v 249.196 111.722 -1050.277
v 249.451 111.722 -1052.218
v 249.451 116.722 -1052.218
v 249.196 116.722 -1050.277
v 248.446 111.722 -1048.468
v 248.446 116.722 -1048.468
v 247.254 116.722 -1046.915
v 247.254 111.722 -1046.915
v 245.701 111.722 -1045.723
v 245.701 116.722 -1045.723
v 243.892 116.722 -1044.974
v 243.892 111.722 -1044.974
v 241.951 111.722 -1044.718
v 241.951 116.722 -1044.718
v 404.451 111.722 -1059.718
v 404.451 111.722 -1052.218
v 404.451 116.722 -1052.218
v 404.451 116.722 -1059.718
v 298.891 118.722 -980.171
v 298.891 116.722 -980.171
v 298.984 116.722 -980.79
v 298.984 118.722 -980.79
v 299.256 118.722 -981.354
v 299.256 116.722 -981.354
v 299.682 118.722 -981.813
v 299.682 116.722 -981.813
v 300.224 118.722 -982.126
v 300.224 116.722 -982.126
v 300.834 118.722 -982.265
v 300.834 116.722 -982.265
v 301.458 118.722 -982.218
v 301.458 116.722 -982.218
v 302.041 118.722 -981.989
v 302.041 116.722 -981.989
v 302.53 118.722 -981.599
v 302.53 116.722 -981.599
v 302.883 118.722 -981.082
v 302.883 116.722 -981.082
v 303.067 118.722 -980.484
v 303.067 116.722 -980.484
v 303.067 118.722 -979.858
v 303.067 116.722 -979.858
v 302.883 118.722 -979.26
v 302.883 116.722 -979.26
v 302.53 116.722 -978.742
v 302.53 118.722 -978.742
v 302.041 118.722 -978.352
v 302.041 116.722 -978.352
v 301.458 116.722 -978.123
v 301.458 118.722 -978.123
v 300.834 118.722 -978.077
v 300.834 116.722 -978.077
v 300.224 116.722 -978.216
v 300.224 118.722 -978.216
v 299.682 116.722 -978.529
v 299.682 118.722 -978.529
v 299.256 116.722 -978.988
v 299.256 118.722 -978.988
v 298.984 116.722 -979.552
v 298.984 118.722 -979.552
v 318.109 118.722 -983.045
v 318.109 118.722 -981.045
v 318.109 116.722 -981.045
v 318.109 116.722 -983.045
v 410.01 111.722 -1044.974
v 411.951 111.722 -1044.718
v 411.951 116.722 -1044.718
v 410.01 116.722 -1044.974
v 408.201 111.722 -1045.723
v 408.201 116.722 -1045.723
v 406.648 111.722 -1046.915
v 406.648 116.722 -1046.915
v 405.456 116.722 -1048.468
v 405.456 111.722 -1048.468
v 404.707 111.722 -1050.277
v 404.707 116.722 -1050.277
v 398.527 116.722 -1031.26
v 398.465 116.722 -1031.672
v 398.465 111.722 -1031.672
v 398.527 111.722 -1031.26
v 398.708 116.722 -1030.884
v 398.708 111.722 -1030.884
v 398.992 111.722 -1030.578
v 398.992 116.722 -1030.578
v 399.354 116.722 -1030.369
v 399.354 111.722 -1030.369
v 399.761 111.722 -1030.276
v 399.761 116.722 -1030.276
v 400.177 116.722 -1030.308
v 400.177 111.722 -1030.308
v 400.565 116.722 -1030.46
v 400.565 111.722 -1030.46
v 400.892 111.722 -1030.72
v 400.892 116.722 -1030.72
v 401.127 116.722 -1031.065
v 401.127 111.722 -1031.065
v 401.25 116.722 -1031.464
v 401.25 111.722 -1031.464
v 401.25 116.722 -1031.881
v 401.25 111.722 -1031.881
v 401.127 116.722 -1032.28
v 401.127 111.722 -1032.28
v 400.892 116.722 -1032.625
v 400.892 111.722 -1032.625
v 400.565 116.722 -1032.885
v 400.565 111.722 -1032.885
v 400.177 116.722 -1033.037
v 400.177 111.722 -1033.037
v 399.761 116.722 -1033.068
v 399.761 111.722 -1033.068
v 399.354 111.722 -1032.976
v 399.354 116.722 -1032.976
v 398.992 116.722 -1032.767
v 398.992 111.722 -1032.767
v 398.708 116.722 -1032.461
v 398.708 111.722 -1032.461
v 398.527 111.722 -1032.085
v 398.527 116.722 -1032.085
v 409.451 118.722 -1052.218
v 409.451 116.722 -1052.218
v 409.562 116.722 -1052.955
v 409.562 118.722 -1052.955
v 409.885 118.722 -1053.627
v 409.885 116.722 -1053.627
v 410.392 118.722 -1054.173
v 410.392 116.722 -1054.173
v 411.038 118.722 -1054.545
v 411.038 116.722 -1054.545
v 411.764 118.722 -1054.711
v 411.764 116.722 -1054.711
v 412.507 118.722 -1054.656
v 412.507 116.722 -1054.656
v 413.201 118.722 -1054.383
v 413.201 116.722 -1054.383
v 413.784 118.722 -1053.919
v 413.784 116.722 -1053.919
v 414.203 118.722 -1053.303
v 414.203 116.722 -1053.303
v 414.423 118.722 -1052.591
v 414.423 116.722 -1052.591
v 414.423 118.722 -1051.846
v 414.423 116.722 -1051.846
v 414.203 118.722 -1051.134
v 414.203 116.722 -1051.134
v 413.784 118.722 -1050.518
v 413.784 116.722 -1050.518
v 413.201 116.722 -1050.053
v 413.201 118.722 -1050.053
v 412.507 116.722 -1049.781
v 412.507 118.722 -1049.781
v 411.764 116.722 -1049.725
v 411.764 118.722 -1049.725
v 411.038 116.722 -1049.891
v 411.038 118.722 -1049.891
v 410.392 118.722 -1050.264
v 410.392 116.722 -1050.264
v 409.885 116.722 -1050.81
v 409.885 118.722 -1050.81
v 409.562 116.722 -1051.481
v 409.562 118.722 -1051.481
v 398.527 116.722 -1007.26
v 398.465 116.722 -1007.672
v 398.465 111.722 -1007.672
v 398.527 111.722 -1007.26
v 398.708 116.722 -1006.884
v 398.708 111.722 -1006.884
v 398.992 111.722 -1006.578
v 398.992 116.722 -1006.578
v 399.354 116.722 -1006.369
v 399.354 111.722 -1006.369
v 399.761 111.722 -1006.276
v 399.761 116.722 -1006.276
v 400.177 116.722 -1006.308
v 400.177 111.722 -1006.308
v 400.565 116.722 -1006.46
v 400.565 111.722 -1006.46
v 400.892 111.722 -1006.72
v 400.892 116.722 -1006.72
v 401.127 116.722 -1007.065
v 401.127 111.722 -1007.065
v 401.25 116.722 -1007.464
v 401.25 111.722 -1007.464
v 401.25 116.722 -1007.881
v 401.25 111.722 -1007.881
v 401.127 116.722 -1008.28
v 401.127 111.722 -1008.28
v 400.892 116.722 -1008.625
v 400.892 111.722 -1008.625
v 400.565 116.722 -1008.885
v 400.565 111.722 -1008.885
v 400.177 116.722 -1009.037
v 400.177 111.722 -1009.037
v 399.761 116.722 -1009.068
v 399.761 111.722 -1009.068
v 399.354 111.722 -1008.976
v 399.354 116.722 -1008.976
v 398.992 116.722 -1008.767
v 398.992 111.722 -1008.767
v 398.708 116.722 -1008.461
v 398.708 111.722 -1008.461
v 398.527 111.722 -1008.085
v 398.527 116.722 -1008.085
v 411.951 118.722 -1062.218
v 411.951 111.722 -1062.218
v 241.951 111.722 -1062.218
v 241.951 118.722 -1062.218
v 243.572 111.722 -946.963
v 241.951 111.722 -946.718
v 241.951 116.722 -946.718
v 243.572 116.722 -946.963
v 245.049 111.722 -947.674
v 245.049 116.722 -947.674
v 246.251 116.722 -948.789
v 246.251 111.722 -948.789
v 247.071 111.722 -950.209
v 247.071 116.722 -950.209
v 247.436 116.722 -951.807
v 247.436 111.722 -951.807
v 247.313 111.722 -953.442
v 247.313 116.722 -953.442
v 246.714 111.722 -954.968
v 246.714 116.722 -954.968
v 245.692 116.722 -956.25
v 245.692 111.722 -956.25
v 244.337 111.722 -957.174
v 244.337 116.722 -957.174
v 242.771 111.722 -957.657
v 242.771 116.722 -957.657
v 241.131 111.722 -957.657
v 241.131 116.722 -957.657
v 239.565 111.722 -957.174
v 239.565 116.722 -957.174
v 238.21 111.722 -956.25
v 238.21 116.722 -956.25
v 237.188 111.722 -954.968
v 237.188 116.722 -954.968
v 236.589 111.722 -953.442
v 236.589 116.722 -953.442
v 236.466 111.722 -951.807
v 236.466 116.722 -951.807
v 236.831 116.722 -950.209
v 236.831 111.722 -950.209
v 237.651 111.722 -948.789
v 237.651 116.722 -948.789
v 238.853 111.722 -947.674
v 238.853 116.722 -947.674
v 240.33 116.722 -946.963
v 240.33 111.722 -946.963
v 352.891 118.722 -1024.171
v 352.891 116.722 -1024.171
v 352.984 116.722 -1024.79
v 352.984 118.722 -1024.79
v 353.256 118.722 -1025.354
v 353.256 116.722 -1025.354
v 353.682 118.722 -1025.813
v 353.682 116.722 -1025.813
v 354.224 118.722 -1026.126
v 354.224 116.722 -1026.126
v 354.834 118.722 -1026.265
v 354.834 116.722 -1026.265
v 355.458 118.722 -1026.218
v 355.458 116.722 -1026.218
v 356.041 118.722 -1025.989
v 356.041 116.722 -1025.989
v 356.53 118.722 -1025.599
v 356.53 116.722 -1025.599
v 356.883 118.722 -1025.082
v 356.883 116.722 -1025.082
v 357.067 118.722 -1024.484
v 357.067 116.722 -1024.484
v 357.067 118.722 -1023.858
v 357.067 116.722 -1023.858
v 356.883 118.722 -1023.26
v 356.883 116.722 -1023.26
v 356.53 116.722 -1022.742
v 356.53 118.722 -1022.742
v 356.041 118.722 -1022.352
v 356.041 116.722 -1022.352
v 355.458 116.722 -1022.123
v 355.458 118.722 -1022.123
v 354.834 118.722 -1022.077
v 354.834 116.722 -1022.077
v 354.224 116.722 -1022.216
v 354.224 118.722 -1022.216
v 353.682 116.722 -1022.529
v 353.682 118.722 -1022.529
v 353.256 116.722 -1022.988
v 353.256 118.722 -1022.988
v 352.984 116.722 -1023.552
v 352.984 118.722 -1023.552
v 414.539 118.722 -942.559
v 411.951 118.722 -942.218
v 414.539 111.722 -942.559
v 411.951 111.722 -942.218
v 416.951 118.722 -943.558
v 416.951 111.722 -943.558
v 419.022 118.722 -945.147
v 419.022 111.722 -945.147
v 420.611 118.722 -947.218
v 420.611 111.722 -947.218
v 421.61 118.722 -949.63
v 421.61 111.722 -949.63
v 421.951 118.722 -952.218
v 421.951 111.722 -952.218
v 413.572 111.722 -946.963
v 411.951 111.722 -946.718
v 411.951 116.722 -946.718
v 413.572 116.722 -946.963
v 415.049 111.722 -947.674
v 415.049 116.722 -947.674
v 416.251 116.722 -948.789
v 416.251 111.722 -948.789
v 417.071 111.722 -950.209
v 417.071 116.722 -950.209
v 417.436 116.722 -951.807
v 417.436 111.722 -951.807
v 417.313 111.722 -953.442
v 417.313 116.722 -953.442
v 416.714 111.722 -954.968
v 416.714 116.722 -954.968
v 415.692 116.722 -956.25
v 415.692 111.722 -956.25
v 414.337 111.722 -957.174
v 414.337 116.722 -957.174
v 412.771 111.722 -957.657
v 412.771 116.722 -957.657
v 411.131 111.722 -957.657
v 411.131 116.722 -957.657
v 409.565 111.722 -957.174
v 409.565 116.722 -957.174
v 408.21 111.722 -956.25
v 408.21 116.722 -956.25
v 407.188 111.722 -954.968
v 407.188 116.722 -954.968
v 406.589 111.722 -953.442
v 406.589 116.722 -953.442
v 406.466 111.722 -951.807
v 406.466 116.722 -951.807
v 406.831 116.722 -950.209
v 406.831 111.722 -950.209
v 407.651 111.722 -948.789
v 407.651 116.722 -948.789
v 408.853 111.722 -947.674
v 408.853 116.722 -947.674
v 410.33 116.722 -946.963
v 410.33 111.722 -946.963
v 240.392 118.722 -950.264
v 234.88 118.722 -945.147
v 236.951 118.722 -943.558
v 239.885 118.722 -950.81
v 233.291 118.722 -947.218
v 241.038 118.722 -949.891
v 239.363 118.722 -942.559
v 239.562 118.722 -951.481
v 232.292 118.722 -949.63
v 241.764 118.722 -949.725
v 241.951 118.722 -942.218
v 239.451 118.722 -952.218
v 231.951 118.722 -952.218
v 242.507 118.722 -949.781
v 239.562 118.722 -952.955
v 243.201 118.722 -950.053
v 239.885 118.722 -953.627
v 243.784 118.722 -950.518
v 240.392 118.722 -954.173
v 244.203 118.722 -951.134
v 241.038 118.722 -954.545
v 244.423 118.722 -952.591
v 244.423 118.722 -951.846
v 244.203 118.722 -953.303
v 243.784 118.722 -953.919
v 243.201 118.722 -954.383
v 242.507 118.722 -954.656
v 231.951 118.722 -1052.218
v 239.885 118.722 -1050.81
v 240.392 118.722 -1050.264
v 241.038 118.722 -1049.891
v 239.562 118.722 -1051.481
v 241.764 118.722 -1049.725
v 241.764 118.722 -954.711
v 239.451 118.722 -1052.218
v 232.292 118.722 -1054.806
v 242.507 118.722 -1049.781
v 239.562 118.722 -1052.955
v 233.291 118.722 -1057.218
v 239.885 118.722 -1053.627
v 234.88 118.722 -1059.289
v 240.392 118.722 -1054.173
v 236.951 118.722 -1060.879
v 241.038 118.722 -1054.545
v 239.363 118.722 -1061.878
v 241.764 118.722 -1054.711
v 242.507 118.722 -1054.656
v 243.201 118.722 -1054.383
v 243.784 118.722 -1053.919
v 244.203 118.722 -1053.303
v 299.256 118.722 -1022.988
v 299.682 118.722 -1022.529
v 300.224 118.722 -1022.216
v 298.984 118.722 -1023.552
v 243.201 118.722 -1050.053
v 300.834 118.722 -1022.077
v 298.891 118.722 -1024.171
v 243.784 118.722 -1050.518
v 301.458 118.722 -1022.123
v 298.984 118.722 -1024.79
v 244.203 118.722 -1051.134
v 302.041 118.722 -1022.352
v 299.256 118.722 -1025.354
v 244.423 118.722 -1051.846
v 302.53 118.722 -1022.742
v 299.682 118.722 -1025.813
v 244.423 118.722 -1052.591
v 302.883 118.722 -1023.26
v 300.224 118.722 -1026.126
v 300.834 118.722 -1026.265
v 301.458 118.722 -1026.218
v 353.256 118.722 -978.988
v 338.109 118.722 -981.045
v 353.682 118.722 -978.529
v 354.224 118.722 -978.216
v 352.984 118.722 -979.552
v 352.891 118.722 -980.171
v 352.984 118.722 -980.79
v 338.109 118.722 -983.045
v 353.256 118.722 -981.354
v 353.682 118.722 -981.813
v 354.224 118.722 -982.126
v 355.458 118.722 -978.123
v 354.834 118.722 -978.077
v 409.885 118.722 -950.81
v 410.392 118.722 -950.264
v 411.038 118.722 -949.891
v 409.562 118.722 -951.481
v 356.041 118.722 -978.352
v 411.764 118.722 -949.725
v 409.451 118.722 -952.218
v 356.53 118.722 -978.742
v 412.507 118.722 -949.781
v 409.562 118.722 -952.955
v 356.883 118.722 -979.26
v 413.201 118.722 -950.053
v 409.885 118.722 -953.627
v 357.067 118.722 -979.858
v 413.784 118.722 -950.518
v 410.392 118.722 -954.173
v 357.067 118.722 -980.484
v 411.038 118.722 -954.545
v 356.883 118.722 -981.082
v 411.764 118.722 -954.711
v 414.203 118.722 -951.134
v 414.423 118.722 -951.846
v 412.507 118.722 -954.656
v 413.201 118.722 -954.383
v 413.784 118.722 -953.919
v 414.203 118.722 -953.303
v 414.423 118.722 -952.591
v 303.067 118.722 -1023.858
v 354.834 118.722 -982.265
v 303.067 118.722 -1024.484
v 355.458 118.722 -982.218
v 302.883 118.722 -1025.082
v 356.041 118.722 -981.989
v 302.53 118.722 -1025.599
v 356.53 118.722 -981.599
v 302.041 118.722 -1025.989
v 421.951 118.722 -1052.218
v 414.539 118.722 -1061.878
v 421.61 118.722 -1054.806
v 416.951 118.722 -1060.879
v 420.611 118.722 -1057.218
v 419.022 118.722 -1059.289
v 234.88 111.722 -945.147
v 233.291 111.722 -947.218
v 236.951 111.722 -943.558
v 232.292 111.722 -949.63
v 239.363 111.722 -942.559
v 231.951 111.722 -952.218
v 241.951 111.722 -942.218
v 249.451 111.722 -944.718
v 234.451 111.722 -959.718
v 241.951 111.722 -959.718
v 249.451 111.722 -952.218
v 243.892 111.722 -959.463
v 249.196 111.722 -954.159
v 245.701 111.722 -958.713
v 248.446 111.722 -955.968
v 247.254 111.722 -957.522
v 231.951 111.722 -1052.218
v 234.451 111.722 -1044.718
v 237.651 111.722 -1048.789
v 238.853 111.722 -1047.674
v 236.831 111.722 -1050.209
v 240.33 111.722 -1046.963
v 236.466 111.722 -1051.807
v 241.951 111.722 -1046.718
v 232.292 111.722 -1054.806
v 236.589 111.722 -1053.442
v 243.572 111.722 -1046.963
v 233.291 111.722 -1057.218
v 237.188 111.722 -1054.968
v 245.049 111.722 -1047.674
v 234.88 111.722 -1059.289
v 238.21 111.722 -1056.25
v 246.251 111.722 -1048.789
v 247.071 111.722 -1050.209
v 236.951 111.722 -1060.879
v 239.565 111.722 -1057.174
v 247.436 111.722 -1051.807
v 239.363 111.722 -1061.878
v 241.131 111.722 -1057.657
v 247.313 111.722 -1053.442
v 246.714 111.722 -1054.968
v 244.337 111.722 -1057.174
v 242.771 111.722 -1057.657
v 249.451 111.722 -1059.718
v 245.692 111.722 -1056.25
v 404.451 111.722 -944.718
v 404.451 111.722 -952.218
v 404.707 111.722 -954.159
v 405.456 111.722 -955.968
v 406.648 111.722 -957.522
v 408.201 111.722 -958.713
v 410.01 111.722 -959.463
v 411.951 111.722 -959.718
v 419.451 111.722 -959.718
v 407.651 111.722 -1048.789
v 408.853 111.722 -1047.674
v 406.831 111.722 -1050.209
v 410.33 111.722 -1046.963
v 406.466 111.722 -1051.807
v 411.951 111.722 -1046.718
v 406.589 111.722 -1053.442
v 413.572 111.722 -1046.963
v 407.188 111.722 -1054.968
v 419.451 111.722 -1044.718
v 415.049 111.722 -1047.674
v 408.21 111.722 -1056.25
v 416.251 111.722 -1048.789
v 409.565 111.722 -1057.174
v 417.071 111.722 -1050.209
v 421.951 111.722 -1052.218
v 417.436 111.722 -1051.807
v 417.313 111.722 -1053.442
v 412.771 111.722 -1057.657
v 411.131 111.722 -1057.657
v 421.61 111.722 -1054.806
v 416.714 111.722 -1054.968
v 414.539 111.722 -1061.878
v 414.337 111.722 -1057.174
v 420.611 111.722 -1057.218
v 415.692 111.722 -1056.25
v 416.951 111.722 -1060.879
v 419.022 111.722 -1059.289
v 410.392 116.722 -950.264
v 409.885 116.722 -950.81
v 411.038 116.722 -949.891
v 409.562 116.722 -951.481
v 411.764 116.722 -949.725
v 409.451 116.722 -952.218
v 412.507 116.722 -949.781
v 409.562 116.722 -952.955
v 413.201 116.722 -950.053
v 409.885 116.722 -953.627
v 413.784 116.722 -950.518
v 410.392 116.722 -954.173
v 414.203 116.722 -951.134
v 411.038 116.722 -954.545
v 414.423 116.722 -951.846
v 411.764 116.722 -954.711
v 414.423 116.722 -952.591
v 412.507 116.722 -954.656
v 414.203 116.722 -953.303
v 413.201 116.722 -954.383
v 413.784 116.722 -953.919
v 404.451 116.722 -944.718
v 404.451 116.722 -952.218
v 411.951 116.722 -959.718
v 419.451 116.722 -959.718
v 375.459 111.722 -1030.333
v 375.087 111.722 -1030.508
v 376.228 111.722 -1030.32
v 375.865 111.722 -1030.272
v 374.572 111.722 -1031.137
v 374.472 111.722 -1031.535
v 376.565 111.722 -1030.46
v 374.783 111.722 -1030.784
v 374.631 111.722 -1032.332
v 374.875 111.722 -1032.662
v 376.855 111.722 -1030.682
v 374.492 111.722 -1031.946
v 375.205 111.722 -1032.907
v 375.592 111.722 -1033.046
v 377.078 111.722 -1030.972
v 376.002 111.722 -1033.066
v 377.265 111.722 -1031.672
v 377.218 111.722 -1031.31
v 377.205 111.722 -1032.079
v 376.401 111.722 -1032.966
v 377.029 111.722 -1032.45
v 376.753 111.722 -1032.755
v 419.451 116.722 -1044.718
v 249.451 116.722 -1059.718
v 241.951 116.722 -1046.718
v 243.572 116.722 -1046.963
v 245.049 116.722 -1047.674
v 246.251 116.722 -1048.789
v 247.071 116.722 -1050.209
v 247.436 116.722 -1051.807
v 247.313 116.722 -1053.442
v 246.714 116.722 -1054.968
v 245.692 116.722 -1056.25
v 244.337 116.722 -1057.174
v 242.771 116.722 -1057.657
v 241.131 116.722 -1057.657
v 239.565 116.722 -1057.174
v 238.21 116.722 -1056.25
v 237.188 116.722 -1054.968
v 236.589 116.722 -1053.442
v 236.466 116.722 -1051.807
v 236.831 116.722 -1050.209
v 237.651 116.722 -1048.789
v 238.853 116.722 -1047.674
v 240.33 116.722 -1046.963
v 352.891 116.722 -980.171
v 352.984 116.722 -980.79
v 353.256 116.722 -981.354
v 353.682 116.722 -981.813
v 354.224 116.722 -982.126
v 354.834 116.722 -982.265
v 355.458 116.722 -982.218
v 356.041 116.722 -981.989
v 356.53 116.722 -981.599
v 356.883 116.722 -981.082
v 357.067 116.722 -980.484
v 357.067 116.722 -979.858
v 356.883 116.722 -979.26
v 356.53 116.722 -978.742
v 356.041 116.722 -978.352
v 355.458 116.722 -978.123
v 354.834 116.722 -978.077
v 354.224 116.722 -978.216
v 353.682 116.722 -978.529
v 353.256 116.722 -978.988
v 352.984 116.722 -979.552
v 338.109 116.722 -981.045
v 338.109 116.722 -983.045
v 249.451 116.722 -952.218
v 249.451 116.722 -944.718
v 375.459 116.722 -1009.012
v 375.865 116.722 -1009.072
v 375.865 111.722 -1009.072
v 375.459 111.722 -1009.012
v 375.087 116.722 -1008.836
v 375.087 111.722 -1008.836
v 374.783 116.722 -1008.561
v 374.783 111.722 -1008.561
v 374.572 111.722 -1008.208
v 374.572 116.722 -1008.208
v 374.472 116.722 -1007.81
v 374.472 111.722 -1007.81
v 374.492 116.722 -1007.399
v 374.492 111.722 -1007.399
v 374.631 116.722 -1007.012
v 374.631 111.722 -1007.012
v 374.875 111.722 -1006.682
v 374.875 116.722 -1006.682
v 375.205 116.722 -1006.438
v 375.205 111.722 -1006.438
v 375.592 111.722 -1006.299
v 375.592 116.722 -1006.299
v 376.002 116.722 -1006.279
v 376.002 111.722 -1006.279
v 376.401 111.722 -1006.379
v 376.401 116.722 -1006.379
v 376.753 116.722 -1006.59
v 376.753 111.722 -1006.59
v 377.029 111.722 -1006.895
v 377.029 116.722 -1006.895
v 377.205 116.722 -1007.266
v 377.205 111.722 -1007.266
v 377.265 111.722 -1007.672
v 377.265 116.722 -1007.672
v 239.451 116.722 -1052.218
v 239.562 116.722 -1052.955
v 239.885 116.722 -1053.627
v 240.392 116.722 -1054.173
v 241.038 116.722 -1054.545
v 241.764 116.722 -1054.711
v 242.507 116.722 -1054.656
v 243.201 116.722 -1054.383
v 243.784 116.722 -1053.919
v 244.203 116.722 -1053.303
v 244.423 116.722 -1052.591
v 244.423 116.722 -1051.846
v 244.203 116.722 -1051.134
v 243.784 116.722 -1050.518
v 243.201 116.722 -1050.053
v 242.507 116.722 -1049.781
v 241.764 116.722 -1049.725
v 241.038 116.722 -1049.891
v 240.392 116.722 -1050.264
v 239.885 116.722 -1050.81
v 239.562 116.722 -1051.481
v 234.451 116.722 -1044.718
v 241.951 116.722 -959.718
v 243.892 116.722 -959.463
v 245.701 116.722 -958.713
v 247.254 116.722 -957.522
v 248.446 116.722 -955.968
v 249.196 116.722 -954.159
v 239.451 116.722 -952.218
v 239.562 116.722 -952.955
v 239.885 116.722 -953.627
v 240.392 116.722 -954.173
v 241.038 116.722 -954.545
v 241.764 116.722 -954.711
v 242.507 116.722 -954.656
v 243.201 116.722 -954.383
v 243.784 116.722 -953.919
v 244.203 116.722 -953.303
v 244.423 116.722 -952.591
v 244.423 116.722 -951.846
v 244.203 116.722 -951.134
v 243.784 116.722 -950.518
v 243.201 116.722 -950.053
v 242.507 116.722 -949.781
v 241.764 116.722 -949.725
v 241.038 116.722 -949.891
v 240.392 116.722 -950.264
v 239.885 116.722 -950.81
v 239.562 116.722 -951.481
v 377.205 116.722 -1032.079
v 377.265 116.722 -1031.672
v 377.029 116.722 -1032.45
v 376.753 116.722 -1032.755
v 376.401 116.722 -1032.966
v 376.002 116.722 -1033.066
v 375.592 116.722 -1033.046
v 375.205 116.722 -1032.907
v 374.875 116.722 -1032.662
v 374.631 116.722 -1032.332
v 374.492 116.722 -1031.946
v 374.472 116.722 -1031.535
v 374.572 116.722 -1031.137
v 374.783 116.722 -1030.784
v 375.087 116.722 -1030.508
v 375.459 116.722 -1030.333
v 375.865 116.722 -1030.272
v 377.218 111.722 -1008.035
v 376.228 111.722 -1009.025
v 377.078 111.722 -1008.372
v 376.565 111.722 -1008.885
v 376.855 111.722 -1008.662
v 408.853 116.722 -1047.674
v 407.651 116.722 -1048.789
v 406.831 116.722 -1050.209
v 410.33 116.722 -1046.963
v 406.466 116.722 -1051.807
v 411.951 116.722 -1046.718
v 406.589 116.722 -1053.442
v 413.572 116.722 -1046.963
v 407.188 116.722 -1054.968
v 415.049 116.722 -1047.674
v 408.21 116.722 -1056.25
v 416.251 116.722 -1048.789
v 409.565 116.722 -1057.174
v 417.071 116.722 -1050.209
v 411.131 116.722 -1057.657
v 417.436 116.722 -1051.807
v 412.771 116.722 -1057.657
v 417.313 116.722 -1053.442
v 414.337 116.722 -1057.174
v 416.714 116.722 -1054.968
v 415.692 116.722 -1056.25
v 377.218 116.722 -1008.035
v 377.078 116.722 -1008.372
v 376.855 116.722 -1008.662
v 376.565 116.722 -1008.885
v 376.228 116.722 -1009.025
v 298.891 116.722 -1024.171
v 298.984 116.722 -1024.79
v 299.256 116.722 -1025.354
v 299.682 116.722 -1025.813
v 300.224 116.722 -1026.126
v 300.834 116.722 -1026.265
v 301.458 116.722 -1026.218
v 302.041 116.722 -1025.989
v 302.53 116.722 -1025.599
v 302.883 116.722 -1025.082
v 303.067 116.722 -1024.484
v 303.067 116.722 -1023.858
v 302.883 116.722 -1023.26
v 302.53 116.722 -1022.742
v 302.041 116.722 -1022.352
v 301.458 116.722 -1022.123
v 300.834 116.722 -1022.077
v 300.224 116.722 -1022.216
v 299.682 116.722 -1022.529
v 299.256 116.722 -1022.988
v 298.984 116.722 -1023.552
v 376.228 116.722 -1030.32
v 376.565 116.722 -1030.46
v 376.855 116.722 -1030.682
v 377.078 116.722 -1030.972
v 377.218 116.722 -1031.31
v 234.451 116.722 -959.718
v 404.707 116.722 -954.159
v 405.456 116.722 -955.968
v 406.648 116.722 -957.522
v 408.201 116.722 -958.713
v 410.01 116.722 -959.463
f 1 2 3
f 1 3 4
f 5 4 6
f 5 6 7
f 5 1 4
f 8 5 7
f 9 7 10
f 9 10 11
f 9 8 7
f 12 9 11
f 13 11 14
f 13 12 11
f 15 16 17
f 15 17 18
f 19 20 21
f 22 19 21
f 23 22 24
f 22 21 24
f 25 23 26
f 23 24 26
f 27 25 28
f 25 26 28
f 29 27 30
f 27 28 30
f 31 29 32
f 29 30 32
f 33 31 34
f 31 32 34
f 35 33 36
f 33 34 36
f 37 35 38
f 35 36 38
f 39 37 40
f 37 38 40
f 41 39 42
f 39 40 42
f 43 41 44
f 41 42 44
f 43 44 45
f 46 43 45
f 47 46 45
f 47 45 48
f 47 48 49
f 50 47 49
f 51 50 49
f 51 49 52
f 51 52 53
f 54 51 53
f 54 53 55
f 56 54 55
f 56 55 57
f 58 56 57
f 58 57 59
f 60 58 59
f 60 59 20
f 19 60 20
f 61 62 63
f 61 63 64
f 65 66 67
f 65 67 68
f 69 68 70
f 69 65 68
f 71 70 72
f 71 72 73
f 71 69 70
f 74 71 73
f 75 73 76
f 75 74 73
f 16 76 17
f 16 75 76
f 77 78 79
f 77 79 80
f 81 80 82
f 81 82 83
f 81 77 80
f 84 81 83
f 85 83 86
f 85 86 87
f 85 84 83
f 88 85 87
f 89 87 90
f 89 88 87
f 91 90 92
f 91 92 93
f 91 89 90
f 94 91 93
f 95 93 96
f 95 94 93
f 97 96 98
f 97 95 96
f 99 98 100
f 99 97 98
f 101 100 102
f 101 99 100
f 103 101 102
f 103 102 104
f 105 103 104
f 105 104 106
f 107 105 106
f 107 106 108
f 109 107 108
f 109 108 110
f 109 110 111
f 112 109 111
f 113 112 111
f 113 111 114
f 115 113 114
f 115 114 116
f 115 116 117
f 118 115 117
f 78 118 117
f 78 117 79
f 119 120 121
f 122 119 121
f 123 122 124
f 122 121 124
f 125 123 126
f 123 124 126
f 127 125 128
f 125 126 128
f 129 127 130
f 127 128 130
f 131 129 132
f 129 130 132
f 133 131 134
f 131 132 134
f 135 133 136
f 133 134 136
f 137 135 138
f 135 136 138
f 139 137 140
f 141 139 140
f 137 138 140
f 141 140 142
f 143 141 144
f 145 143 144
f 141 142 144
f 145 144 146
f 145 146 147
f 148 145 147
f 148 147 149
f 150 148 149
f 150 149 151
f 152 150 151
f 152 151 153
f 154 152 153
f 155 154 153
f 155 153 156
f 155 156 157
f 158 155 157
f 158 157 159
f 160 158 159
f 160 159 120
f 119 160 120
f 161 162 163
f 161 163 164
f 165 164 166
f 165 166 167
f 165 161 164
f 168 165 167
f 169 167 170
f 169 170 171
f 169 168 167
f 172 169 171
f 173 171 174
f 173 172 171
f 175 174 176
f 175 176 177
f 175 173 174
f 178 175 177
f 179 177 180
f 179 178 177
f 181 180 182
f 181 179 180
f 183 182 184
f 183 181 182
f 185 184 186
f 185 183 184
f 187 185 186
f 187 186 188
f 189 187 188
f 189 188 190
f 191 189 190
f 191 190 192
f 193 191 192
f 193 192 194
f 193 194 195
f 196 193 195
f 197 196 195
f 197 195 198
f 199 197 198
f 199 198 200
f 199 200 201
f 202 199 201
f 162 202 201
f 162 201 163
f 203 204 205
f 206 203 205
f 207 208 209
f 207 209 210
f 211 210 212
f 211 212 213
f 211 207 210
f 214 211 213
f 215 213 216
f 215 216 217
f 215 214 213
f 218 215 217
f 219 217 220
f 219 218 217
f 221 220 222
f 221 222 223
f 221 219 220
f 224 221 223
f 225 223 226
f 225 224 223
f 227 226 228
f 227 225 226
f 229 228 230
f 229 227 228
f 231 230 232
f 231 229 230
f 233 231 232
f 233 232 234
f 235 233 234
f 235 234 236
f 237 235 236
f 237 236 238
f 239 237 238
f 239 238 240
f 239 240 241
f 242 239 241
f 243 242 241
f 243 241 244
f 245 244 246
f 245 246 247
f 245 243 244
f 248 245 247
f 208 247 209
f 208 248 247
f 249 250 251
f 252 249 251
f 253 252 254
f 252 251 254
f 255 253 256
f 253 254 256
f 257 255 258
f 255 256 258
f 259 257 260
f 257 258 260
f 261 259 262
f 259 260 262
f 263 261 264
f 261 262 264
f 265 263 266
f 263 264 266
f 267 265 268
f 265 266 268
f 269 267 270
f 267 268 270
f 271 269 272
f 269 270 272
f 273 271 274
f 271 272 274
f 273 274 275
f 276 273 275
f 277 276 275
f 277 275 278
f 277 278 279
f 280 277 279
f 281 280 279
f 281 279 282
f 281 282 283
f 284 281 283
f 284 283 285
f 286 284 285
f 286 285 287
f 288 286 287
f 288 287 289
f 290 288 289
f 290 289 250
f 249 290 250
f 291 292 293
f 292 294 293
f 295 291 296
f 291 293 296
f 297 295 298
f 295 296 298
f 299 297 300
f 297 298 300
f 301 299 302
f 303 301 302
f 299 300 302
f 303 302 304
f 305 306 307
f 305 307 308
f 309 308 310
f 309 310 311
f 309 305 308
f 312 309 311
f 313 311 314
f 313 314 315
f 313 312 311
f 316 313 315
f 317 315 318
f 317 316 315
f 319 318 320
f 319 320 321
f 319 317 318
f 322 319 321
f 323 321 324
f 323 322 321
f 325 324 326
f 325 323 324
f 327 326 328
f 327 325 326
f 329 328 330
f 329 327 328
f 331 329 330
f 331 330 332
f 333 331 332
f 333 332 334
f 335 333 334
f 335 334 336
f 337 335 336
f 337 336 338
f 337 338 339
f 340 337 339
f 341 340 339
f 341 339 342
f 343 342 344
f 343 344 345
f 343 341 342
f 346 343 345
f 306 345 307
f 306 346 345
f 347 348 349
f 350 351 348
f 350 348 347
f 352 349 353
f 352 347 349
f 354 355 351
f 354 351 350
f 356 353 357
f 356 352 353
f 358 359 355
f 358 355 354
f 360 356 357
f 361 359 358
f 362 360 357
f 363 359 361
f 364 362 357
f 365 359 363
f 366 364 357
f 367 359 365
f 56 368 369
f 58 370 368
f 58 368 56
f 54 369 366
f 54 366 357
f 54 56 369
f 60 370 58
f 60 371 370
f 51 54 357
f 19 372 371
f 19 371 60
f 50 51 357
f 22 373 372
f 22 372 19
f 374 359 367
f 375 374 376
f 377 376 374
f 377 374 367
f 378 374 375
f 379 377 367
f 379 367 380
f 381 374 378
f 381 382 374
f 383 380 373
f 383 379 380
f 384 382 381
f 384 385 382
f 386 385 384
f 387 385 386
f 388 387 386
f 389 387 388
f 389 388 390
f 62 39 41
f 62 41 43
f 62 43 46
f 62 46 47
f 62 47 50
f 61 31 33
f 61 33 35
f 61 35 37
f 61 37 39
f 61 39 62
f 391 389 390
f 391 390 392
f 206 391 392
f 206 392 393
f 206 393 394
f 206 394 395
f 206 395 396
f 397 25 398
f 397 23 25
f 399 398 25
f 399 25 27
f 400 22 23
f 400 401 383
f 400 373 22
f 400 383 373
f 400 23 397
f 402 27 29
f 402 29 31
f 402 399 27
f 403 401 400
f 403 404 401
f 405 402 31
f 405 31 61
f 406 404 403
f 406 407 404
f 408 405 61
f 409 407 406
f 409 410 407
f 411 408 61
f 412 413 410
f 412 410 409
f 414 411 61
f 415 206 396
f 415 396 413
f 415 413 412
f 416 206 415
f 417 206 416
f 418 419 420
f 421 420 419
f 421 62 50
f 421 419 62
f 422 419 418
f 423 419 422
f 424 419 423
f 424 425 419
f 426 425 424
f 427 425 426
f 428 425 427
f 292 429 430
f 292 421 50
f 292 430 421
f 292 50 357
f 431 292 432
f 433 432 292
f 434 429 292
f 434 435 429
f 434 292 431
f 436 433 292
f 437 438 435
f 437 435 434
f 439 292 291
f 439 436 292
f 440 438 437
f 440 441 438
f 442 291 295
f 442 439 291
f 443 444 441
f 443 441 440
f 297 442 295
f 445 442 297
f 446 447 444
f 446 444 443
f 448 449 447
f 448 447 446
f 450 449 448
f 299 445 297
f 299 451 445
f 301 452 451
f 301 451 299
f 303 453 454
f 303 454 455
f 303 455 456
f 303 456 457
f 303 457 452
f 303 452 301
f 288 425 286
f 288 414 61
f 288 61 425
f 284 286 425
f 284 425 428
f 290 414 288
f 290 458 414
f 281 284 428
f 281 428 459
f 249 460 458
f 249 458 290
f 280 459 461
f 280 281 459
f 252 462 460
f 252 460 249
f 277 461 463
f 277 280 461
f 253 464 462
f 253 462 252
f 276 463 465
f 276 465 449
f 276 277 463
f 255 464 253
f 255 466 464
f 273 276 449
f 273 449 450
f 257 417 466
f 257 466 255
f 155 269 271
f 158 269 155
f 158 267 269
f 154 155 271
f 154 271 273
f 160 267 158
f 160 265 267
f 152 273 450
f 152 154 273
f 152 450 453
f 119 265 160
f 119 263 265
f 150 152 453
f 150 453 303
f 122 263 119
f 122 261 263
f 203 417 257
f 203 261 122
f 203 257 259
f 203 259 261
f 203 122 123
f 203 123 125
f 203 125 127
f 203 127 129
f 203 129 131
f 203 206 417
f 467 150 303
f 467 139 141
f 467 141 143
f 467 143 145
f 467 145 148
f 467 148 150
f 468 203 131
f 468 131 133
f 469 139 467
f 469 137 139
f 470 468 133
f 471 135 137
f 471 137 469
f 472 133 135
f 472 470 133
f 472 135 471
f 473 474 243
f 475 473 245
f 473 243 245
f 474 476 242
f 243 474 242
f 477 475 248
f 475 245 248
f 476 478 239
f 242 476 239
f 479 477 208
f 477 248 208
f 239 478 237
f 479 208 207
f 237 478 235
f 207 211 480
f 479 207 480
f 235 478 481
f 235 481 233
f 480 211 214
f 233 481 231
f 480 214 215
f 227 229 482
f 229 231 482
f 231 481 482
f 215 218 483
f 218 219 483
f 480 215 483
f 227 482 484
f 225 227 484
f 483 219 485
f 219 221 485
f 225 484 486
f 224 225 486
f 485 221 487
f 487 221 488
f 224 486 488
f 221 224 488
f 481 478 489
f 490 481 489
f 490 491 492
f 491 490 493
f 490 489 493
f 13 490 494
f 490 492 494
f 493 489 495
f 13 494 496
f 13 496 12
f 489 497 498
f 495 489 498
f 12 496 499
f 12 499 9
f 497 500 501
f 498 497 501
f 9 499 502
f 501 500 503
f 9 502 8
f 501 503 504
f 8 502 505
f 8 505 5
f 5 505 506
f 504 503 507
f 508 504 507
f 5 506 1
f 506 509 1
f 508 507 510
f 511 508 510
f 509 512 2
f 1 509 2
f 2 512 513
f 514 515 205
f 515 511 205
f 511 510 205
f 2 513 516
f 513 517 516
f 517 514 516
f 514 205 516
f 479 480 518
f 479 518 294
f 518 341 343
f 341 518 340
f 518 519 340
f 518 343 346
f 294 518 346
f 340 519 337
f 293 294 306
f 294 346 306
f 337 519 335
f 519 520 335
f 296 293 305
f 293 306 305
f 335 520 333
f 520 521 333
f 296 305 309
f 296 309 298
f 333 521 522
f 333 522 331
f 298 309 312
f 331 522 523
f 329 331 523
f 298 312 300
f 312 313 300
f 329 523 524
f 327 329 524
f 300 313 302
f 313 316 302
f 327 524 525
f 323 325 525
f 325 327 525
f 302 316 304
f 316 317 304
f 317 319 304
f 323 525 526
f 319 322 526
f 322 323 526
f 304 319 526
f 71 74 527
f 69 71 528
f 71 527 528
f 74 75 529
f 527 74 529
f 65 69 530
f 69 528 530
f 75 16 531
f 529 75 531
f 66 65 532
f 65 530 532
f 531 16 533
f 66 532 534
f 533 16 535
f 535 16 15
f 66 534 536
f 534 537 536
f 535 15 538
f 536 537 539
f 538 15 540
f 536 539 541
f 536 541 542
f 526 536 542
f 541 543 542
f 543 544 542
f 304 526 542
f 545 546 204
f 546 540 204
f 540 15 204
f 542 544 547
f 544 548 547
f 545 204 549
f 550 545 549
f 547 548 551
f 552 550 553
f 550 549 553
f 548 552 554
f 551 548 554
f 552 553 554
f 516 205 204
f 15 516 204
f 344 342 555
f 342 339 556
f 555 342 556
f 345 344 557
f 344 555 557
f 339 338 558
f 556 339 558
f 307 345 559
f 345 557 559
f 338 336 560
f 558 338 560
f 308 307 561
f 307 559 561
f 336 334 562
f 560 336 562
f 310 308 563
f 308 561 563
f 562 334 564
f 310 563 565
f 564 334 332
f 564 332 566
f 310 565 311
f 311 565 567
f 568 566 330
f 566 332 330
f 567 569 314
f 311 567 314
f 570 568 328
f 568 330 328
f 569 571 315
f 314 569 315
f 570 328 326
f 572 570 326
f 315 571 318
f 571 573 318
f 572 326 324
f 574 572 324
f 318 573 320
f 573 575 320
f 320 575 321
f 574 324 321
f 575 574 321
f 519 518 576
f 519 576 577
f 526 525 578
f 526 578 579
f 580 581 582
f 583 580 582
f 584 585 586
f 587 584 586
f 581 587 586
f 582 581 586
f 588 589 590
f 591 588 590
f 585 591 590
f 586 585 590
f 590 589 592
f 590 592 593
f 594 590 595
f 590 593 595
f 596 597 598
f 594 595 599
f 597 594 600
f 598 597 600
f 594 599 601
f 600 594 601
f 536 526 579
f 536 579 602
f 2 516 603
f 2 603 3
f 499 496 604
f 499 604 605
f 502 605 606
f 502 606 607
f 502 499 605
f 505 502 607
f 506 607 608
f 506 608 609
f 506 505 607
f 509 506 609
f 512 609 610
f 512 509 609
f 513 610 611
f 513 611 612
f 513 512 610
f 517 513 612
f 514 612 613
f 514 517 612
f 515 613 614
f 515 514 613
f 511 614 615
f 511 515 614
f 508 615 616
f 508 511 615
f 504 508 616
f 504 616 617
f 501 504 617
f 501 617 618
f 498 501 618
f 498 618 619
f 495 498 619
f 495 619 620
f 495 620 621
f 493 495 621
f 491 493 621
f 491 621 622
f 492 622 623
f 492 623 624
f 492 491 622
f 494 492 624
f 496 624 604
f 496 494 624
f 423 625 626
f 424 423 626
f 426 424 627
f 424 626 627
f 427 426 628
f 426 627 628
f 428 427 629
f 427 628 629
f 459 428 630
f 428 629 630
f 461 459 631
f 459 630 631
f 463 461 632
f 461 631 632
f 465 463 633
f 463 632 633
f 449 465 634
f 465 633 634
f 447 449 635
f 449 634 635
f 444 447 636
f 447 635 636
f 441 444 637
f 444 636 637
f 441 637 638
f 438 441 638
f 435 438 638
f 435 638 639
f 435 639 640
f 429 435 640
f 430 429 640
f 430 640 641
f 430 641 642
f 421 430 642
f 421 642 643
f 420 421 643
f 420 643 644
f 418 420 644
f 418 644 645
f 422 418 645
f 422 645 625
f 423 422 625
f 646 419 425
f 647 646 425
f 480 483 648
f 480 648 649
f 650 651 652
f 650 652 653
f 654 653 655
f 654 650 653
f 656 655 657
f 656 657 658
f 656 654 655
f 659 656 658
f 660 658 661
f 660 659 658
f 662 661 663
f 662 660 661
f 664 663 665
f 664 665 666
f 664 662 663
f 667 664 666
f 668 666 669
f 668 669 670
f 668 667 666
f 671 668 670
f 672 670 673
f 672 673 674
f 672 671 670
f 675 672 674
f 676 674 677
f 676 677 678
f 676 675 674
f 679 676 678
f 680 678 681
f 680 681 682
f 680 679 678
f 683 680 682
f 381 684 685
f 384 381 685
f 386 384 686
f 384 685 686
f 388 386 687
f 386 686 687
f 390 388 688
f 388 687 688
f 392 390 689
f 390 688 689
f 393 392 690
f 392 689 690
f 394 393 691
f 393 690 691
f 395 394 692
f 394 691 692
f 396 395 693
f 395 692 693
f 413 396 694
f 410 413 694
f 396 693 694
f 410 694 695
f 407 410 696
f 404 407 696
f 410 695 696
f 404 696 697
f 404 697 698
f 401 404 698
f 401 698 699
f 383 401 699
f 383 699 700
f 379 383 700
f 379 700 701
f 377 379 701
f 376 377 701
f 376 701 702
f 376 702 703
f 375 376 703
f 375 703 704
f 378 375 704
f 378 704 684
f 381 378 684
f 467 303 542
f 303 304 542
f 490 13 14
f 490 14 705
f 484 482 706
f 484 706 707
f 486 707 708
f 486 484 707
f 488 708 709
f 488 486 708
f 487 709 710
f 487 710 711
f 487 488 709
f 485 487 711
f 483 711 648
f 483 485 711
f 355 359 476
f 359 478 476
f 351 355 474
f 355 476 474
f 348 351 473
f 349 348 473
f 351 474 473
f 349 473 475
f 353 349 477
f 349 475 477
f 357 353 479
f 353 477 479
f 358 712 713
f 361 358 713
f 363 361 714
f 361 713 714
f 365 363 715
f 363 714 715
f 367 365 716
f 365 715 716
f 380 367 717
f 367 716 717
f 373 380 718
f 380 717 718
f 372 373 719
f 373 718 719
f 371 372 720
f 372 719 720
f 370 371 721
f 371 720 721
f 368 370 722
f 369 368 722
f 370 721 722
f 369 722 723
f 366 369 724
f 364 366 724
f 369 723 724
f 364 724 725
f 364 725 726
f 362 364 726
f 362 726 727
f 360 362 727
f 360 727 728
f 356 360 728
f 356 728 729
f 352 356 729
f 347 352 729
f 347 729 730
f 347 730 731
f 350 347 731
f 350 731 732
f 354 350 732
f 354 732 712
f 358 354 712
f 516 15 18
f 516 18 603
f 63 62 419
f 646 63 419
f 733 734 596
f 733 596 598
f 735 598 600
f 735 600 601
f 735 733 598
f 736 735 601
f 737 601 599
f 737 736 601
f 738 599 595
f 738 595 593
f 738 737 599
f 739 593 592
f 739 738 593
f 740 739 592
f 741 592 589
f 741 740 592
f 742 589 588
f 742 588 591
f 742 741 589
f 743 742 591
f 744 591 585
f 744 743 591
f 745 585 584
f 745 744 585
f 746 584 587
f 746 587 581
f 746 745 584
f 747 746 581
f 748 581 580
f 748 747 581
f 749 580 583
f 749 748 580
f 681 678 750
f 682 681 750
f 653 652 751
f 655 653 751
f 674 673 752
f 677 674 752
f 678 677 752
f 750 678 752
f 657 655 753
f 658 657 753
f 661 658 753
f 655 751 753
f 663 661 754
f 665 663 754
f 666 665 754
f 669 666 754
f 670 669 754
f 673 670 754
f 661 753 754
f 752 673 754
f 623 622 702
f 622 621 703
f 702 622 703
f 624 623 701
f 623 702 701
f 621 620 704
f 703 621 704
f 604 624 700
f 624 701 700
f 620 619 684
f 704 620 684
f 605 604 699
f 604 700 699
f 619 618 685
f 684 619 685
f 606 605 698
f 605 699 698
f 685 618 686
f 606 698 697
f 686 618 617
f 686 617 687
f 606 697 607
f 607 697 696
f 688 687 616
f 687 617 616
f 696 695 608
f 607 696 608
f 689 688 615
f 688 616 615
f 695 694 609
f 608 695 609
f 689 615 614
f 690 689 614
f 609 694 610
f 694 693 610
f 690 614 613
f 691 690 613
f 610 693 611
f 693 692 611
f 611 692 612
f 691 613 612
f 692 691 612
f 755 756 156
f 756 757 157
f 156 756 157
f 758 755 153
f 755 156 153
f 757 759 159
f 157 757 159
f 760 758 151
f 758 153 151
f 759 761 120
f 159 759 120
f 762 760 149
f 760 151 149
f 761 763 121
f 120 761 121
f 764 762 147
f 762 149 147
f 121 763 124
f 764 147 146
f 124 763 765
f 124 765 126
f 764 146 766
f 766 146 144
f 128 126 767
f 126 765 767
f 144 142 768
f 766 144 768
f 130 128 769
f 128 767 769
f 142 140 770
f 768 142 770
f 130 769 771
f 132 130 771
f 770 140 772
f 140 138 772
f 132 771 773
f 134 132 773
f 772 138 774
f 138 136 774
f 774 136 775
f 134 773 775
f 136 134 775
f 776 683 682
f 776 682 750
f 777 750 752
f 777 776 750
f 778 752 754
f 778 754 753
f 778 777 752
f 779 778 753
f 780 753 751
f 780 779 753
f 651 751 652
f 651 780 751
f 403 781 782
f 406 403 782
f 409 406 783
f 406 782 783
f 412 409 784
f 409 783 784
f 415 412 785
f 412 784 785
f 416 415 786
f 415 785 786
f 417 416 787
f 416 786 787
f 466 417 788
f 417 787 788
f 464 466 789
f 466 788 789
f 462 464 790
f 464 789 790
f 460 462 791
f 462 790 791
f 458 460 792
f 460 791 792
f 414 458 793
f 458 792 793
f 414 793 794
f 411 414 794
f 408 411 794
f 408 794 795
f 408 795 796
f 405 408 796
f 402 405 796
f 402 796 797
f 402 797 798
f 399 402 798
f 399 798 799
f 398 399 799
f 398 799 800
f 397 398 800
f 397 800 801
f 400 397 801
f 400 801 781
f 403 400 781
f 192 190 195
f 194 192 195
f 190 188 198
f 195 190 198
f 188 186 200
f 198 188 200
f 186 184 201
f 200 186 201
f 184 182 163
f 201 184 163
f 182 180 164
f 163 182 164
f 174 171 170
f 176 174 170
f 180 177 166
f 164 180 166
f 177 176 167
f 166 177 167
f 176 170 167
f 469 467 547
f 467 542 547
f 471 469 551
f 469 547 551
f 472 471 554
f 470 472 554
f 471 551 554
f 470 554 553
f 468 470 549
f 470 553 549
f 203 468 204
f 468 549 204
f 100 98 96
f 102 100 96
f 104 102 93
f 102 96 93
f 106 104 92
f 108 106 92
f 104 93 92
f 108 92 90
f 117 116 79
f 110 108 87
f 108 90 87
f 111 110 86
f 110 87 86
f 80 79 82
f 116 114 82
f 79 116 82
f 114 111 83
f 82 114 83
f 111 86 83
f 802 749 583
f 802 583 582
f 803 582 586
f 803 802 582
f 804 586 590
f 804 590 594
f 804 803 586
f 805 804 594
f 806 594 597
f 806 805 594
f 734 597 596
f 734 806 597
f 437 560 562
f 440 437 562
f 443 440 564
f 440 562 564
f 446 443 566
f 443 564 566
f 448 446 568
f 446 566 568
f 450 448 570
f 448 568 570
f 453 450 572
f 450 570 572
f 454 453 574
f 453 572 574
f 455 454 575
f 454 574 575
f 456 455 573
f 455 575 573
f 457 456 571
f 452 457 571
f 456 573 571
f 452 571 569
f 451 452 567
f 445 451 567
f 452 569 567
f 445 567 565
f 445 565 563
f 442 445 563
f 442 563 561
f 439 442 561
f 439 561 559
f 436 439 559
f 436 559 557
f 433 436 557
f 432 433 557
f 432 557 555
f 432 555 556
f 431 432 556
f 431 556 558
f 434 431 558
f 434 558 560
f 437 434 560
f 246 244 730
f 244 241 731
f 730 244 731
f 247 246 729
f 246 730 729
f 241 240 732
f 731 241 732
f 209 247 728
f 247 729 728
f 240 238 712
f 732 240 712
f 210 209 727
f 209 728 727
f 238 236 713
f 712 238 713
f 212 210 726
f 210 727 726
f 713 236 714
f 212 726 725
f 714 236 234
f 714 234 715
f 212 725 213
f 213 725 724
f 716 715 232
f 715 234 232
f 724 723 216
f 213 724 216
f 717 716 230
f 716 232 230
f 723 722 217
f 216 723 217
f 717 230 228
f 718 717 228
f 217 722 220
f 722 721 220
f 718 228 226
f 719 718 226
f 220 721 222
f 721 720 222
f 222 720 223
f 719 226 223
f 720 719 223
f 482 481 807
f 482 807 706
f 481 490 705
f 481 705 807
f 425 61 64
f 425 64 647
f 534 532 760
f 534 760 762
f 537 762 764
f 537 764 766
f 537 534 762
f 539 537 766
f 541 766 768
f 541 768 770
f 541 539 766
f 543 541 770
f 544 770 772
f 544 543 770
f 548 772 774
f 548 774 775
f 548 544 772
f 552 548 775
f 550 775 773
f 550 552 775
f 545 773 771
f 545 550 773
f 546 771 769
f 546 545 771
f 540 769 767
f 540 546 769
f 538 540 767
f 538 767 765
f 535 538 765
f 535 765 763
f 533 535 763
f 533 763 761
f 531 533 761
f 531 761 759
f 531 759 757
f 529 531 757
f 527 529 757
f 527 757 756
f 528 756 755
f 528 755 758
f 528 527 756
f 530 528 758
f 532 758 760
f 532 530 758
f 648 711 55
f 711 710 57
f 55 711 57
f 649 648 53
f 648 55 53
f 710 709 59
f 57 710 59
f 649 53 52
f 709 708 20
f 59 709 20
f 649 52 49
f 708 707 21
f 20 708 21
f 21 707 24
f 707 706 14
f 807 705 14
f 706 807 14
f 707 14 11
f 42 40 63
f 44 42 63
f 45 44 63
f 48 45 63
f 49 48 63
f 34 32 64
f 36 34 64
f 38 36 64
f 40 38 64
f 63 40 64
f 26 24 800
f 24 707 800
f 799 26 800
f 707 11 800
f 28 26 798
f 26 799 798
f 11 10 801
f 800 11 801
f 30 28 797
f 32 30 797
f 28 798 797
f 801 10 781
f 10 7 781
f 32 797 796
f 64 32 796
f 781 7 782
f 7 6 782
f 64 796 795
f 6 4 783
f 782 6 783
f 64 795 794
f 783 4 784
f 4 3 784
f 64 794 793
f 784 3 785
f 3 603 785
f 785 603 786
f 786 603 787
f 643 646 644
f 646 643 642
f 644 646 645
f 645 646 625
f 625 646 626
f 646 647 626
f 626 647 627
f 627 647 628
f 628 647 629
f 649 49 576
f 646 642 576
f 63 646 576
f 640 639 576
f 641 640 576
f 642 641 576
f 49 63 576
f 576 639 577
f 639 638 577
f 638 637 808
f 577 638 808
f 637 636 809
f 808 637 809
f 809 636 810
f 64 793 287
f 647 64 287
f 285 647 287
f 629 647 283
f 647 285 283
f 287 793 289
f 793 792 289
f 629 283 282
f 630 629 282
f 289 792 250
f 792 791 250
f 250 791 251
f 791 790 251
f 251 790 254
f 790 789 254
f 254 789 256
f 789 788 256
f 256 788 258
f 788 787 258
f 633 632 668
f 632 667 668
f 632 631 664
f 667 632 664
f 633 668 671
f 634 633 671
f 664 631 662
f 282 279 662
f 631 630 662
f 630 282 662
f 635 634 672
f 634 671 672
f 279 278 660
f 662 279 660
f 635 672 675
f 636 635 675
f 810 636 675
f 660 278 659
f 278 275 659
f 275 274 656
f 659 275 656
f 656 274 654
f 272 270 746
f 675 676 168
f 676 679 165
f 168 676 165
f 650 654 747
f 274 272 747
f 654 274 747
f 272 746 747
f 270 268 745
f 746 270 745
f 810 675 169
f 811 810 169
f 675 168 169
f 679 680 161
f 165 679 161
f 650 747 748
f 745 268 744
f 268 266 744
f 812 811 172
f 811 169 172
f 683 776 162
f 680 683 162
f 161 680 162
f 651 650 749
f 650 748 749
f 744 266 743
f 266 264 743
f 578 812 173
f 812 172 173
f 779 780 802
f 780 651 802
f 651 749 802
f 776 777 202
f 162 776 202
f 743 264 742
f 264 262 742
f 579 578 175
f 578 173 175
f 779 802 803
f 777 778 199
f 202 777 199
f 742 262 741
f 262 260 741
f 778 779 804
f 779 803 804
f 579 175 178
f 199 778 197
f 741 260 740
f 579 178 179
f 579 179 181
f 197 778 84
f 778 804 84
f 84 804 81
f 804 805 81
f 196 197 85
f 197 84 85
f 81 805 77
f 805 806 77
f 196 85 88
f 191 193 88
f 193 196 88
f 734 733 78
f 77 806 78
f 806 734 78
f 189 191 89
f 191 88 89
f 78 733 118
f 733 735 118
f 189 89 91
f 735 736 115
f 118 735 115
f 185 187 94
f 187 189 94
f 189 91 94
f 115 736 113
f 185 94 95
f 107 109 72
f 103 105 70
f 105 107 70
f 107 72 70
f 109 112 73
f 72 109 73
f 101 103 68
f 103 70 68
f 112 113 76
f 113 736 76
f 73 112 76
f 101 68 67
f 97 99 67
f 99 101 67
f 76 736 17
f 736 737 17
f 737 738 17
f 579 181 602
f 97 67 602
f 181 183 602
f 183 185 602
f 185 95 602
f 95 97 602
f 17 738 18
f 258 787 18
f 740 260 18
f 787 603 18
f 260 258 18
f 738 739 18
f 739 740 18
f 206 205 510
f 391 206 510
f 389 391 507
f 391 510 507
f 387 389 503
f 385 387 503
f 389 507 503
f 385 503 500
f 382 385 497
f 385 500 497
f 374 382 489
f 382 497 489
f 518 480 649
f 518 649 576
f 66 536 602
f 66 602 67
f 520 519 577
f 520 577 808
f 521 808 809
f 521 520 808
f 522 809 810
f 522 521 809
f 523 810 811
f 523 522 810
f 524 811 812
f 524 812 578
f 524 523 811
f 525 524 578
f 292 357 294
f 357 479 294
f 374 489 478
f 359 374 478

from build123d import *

# Parameters (mm, degrees)
SKETCH1_R                      = 5.5
BOSS_EXTRUDE1_DEPTH            = 5
BOSS_EXTRUDE2_DEPTH            = 2
SKETCH4_R                      = 1.4
BOSS_EXTRUDE3_DEPTH            = 7
SKETCH12_W                     = 20
SKETCH12_H                     = 2
CUT_EXTRUDE1_DEPTH             = 10
F_4_2_4_2_DIAMETER_HOLE1_D     = 4.2
F_4_2_4_2_DIAMETER_HOLE1_DEPTH = 20
F_4_2_4_2_DIAMETER_HOLE1_TIP   = 1.2618073
F_5_0_5_DIAMETER_HOLE1_D       = 5
F_5_0_5_DIAMETER_HOLE1_DEPTH   = 5
F_5_0_5_DIAMETER_HOLE1_TIP     = 1.502151548


with BuildPart() as part:
    # Sketch1 → Boss-Extrude1 (new body)
    with BuildSketch(Plane(origin=(0, 111.722415865, 0), x_dir=(1, 0, 0), z_dir=(0, 1, 0))):
        with BuildLine():
            Line((241.95107426, 942.218289838), (411.95107426, 942.218289838))
            ThreePointArc((411.95107426, 942.218289838), (419.022142072, 945.147222026), (421.95107426, 952.218289838))
            Line((421.95107426, 952.218289838), (421.95107426, 1052.218289838))
            ThreePointArc((421.95107426, 1052.218289838), (419.022142072, 1059.28935765), (411.95107426, 1062.218289838))
            Line((411.95107426, 1062.218289838), (241.95107426, 1062.218289838))
            ThreePointArc((241.95107426, 1062.218289838), (234.880006448, 1059.28935765), (231.95107426, 1052.218289838))
            Line((231.95107426, 1052.218289838), (231.95107426, 952.218289838))
            ThreePointArc((231.95107426, 952.218289838), (234.880006448, 945.147222026), (241.95107426, 942.218289838))
        make_face()
        with Locations(Location((241.95107426, 952.218289838, 0), (0, 0, 270))):
            Circle(SKETCH1_R, mode=Mode.SUBTRACT)
        with Locations(Location((411.95107426, 952.218289838, 0), (0, 0, 270))):
            Circle(SKETCH1_R, mode=Mode.SUBTRACT)
        with Locations(Location((411.95107426, 1052.218289838, 0), (0, 0, 270))):
            Circle(SKETCH1_R, mode=Mode.SUBTRACT)
        with Locations(Location((241.95107426, 1052.218289838, 0), (0, 0, 270))):
            Circle(SKETCH1_R, mode=Mode.SUBTRACT)
        with BuildLine():
            Line((249.45107426, 952.218289838), (249.45107426, 944.718289838))
            Line((249.45107426, 944.718289838), (404.45107426, 944.718289838))
            Line((404.45107426, 944.718289838), (404.45107426, 952.218289838))
            ThreePointArc((404.45107426, 952.218289838), (406.647773401, 957.521590697), (411.95107426, 959.718289838))
            Line((411.95107426, 959.718289838), (419.45107426, 959.718289838))
            Line((419.45107426, 959.718289838), (419.45107426, 1044.718289838))
            Line((419.45107426, 1044.718289838), (411.95107426, 1044.718289838))
            ThreePointArc((411.95107426, 1044.718289838), (406.647773401, 1046.914988979), (404.45107426, 1052.218289838))
            Line((404.45107426, 1052.218289838), (404.45107426, 1059.718289838))
            Line((404.45107426, 1059.718289838), (249.45107426, 1059.718289838))
            Line((249.45107426, 1059.718289838), (249.45107426, 1052.218289838))
            ThreePointArc((249.45107426, 1052.218289838), (247.254375119, 1046.914988979), (241.95107426, 1044.718289838))
            Line((241.95107426, 1044.718289838), (234.45107426, 1044.718289838))
            Line((234.45107426, 1044.718289838), (234.45107426, 959.718289838))
            Line((234.45107426, 959.718289838), (241.95107426, 959.718289838))
            ThreePointArc((241.95107426, 959.718289838), (247.254375119, 957.521590697), (249.45107426, 952.218289838))
        make_face(mode=Mode.SUBTRACT)
    extrude(amount=BOSS_EXTRUDE1_DEPTH)

    # Sketch2 → Boss-Extrude2 (add)
    with BuildSketch(Plane(origin=(0, 116.722415865, 0), x_dir=(1, 0, 0), z_dir=(0, 1, 0))):
        with BuildLine():
            Line((231.95107426, 1052.218289838), (231.95107426, 952.218289838))
            ThreePointArc((231.95107426, 952.218289838), (234.880006448, 945.147222026), (241.95107426, 942.218289838))
            Line((241.95107426, 942.218289838), (411.95107426, 942.218289838))
            ThreePointArc((411.95107426, 942.218289838), (419.022142072, 945.147222026), (421.95107426, 952.218289838))
            Line((421.95107426, 952.218289838), (421.95107426, 1052.218289838))
            ThreePointArc((421.95107426, 1052.218289838), (419.022142072, 1059.28935765), (411.95107426, 1062.218289838))
            Line((411.95107426, 1062.218289838), (241.95107426, 1062.218289838))
            ThreePointArc((241.95107426, 1062.218289838), (234.880006448, 1059.28935765), (231.95107426, 1052.218289838))
        make_face()
    extrude(amount=BOSS_EXTRUDE2_DEPTH)

    # Sketch4 → Boss-Extrude3 (add)
    with BuildSketch(Plane(origin=(0, 118.722415865, 0), x_dir=(1, 0, 0), z_dir=(0, 1, 0))):
        with BuildLine():
            Line((375.86522753, 1030.272411662), (375.86522753, 1031.672411662))
            Line((375.86522753, 1031.672411662), (377.26522753, 1031.672411662))
            ThreePointArc((377.26522753, 1031.672411662), (374.875278036, 1032.662361156), (375.86522753, 1030.272411662))
        make_face()
        with BuildLine():
            Line((377.26522753, 1031.672411662), (375.86522753, 1031.672411662))
            Line((375.86522753, 1031.672411662), (375.86522753, 1030.272411662))
            ThreePointArc((375.86522753, 1030.272411662), (376.855177023, 1030.682462168), (377.26522753, 1031.672411662))
        make_face()
        with BuildLine():
            ThreePointArc((377.26522753, 1007.672411662), (376.855177023, 1008.662361156), (375.86522753, 1009.072411662))
            Line((375.86522753, 1009.072411662), (375.86522753, 1007.672411662))
            Line((375.86522753, 1007.672411662), (377.26522753, 1007.672411662))
        make_face()
        with BuildLine():
            Line((375.86522753, 1007.672411662), (375.86522753, 1009.072411662))
            ThreePointArc((375.86522753, 1009.072411662), (374.875278036, 1006.682462168), (377.26522753, 1007.672411662))
            Line((377.26522753, 1007.672411662), (375.86522753, 1007.672411662))
        make_face()
        with Locations(Location((399.86522753, 1031.672411662, 0), (0, 0, 180))):
            Circle(SKETCH4_R)
        with Locations(Location((399.86522753, 1007.672411662, 0), (0, 0, 180))):
            Circle(SKETCH4_R)
    extrude(amount=-BOSS_EXTRUDE3_DEPTH)

    # Sketch12 → Cut-Extrude1 (cut)
    with BuildSketch(Plane(origin=(0, 118.722415865, 0), x_dir=(1, 0, 0), z_dir=(0, 1, 0))):
        with Locations((328.108762335, 982.045276567)):
            Rectangle(SKETCH12_W, SKETCH12_H)
    extrude(amount=-CUT_EXTRUDE1_DEPTH, mode=Mode.SUBTRACT)

    # Ø4.2 (4.2) Diameter Hole1
    with Locations(Plane(origin=(0, 118.722415865, 0), x_dir=(1, 0, 0), z_dir=(0, 1, 0))):
        with Locations((300.990952506, 1024.17077451), (354.990952506, 1024.17077451), (354.990952506, 980.17077451), (300.990952506, 980.17077451)):
            Hole(F_4_2_4_2_DIAMETER_HOLE1_D / 2, depth=F_4_2_4_2_DIAMETER_HOLE1_DEPTH)
            with Locations((0, 0, -(F_4_2_4_2_DIAMETER_HOLE1_DEPTH + F_4_2_4_2_DIAMETER_HOLE1_TIP / 2))):  # 118° drill point
                Cone(0, F_4_2_4_2_DIAMETER_HOLE1_D / 2, F_4_2_4_2_DIAMETER_HOLE1_TIP, mode=Mode.SUBTRACT)

    # Ø5.0 (5) Diameter Hole1
    with Locations(Plane(origin=(0, 118.722415865, 0), x_dir=(1, 0, 0), z_dir=(0, 1, 0))):
        with Locations((241.95107426, 1052.218289838), (411.95107426, 1052.218289838), (411.95107426, 952.218289838), (241.95107426, 952.218289838)):
            Hole(F_5_0_5_DIAMETER_HOLE1_D / 2, depth=F_5_0_5_DIAMETER_HOLE1_DEPTH)
            with Locations((0, 0, -(F_5_0_5_DIAMETER_HOLE1_DEPTH + F_5_0_5_DIAMETER_HOLE1_TIP / 2))):  # 118° drill point
                Cone(0, F_5_0_5_DIAMETER_HOLE1_D / 2, F_5_0_5_DIAMETER_HOLE1_TIP, mode=Mode.SUBTRACT)


solid = part.part
